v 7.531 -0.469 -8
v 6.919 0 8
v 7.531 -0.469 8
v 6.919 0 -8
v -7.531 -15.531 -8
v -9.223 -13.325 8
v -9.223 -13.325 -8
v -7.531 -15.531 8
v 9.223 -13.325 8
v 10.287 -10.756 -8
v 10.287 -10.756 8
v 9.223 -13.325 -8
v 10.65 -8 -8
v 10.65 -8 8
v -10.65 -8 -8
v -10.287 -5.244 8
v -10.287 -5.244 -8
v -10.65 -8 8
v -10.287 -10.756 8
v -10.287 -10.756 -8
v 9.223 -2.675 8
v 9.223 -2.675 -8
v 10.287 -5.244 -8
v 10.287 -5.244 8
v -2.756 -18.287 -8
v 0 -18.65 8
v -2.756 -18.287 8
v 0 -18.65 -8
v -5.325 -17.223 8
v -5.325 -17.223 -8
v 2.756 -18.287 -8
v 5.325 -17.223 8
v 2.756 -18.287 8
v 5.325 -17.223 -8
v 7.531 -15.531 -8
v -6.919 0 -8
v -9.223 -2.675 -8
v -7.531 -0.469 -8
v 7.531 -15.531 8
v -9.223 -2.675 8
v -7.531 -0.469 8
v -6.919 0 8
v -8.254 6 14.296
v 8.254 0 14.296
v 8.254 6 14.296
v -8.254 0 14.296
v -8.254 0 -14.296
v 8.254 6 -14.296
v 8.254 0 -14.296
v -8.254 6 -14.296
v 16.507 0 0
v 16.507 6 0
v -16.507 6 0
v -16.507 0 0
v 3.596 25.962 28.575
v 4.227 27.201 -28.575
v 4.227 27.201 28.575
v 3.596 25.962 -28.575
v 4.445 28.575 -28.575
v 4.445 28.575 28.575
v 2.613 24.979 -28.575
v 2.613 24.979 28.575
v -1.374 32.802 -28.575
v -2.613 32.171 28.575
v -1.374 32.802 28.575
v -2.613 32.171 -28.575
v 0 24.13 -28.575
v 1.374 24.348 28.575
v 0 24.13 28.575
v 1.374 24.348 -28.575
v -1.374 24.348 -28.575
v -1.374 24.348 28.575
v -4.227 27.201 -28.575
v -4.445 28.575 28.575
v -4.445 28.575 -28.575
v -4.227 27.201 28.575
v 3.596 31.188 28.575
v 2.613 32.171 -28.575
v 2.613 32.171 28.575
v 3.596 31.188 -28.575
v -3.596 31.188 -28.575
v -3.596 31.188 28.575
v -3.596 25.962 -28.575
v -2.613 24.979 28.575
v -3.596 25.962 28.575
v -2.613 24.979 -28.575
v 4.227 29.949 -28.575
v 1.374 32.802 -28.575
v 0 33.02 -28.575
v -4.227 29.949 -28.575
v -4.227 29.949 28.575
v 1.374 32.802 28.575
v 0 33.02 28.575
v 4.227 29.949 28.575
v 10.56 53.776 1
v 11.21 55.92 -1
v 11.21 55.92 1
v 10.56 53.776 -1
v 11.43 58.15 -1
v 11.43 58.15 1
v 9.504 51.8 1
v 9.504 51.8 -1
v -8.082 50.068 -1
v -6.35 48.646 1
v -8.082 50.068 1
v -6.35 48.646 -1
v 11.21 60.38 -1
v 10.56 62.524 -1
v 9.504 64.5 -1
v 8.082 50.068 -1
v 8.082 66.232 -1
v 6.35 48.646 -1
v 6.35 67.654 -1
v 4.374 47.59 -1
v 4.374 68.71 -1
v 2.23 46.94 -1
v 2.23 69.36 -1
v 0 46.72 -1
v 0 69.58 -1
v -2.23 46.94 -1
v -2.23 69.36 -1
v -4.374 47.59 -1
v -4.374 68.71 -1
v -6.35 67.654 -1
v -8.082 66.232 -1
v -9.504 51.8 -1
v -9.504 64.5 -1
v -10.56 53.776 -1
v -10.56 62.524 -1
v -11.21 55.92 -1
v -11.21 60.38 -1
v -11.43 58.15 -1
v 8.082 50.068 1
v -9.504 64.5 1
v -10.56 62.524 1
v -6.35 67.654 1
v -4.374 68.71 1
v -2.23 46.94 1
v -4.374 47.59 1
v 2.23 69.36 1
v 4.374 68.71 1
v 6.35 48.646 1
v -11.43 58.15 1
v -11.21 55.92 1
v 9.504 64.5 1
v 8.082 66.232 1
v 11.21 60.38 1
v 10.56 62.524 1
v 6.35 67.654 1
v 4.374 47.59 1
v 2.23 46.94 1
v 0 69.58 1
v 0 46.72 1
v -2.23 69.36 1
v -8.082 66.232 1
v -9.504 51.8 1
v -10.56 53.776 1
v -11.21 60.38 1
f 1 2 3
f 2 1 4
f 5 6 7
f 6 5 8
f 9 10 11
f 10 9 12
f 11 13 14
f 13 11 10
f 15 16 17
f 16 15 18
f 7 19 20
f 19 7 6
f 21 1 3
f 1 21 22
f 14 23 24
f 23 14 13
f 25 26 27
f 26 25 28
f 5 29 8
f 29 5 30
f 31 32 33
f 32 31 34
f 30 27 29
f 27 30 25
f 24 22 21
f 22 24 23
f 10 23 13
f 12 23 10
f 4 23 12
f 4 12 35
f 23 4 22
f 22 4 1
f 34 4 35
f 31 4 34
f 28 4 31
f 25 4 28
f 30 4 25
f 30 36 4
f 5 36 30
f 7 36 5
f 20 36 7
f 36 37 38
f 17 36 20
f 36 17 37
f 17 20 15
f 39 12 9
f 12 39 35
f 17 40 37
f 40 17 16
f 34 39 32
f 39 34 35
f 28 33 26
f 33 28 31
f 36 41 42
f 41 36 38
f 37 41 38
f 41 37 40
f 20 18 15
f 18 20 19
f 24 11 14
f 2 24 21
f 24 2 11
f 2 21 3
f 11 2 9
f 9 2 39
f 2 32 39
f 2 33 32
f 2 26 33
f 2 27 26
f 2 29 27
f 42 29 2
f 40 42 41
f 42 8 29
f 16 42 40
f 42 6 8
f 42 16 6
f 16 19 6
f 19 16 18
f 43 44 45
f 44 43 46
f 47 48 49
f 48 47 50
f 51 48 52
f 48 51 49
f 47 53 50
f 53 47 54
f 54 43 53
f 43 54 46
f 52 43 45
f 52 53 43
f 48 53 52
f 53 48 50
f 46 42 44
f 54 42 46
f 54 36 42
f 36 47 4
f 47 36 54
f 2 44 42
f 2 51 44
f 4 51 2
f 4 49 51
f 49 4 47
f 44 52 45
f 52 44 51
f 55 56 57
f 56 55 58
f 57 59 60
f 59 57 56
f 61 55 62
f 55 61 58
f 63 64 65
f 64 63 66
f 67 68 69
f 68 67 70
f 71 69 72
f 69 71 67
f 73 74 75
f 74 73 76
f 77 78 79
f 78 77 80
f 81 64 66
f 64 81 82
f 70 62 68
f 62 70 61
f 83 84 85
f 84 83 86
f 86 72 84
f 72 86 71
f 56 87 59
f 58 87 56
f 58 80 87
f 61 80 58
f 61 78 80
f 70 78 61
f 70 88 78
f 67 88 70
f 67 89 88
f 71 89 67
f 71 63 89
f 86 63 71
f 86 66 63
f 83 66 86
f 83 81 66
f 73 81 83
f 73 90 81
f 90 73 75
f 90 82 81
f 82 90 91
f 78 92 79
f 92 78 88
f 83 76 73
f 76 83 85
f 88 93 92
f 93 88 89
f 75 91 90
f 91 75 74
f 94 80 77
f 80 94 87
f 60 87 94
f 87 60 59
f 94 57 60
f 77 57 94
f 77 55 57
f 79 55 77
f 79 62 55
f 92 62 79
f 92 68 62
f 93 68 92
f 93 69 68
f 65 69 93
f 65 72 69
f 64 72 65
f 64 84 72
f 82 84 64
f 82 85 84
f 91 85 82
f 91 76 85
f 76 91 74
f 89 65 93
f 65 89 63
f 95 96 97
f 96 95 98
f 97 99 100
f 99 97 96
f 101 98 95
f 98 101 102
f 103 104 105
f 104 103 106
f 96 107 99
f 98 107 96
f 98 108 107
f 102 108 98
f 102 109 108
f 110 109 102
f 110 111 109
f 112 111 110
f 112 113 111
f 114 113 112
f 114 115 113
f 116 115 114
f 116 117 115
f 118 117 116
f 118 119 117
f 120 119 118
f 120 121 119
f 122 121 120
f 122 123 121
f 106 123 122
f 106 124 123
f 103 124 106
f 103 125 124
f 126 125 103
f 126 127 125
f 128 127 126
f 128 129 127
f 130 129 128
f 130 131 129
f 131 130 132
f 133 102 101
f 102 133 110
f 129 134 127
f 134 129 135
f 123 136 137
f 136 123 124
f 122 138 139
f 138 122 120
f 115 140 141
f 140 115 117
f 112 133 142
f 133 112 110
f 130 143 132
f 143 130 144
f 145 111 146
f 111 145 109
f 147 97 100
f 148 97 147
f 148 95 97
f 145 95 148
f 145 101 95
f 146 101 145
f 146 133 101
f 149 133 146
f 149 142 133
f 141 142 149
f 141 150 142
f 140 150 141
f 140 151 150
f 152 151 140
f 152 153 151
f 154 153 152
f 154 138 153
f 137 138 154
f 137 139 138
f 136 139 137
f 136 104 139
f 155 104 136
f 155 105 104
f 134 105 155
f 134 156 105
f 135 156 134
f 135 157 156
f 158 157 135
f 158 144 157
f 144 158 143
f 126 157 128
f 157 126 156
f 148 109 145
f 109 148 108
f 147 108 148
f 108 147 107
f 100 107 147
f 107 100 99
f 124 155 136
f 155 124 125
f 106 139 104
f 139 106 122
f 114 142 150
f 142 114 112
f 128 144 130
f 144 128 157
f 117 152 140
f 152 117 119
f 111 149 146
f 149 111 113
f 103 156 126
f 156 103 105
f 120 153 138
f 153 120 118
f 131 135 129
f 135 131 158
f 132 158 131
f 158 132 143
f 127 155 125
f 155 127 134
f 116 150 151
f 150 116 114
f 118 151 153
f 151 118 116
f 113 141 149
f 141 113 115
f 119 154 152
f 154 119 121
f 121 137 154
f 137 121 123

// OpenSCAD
// Auto-generated by scripts/author_from_manifest.py (Phase D.3).
// Source: data/phase_d_manifest.json (sku_intent='viking-vk100-upright-135f').
// Do not hand-edit — regenerate from the manifest.
//
// @part viking_vk100_upright_135f
// @kind sprinkler_head
// @category head.upright.k56
// @display-name "Viking VK100 Upright K5.6 SR 135°F"
// @mfg viking_group
// @mfg-pn VK100
// @listing UL FM
// @hazard-classes LH OH1
// @price-usd 12.90
// @install-minutes 8
// @crew journeyman
// @k-factor 5.6
// @orientation upright
// @response standard
// @temperature 135F
// @param size_in number default=0.5 label="Size" unit="in"
// @port inlet position=[0,0.014,0] direction=[0,1,0] style=NPT_threaded size_in=0.5 role=drop

size_in = 0.5;
k_factor = 5.6;

length_mm   = 57.15;
body_dia_mm = 25.40;
thread_od   = 21.3;
thread_len  = 16;
deflector_d = body_dia_mm * 0.9;

rotate([180,0,0]) union() {
    translate([0, thread_len/2, 0])
        cylinder(h = thread_len, d = thread_od, center = true, $fn = 24);
    translate([0, -3, 0])
        rotate([90, 0, 0])
        cylinder(h = 6, d = thread_od * 1.55, $fn = 6, center = true);
    translate([0, -length_mm/2, 0])
        cylinder(h = length_mm, d = body_dia_mm * 0.35, center = true, $fn = 20);
    translate([0, -length_mm - 1, 0])
        cylinder(h = 2, d = deflector_d, center = true, $fn = 32);
}
